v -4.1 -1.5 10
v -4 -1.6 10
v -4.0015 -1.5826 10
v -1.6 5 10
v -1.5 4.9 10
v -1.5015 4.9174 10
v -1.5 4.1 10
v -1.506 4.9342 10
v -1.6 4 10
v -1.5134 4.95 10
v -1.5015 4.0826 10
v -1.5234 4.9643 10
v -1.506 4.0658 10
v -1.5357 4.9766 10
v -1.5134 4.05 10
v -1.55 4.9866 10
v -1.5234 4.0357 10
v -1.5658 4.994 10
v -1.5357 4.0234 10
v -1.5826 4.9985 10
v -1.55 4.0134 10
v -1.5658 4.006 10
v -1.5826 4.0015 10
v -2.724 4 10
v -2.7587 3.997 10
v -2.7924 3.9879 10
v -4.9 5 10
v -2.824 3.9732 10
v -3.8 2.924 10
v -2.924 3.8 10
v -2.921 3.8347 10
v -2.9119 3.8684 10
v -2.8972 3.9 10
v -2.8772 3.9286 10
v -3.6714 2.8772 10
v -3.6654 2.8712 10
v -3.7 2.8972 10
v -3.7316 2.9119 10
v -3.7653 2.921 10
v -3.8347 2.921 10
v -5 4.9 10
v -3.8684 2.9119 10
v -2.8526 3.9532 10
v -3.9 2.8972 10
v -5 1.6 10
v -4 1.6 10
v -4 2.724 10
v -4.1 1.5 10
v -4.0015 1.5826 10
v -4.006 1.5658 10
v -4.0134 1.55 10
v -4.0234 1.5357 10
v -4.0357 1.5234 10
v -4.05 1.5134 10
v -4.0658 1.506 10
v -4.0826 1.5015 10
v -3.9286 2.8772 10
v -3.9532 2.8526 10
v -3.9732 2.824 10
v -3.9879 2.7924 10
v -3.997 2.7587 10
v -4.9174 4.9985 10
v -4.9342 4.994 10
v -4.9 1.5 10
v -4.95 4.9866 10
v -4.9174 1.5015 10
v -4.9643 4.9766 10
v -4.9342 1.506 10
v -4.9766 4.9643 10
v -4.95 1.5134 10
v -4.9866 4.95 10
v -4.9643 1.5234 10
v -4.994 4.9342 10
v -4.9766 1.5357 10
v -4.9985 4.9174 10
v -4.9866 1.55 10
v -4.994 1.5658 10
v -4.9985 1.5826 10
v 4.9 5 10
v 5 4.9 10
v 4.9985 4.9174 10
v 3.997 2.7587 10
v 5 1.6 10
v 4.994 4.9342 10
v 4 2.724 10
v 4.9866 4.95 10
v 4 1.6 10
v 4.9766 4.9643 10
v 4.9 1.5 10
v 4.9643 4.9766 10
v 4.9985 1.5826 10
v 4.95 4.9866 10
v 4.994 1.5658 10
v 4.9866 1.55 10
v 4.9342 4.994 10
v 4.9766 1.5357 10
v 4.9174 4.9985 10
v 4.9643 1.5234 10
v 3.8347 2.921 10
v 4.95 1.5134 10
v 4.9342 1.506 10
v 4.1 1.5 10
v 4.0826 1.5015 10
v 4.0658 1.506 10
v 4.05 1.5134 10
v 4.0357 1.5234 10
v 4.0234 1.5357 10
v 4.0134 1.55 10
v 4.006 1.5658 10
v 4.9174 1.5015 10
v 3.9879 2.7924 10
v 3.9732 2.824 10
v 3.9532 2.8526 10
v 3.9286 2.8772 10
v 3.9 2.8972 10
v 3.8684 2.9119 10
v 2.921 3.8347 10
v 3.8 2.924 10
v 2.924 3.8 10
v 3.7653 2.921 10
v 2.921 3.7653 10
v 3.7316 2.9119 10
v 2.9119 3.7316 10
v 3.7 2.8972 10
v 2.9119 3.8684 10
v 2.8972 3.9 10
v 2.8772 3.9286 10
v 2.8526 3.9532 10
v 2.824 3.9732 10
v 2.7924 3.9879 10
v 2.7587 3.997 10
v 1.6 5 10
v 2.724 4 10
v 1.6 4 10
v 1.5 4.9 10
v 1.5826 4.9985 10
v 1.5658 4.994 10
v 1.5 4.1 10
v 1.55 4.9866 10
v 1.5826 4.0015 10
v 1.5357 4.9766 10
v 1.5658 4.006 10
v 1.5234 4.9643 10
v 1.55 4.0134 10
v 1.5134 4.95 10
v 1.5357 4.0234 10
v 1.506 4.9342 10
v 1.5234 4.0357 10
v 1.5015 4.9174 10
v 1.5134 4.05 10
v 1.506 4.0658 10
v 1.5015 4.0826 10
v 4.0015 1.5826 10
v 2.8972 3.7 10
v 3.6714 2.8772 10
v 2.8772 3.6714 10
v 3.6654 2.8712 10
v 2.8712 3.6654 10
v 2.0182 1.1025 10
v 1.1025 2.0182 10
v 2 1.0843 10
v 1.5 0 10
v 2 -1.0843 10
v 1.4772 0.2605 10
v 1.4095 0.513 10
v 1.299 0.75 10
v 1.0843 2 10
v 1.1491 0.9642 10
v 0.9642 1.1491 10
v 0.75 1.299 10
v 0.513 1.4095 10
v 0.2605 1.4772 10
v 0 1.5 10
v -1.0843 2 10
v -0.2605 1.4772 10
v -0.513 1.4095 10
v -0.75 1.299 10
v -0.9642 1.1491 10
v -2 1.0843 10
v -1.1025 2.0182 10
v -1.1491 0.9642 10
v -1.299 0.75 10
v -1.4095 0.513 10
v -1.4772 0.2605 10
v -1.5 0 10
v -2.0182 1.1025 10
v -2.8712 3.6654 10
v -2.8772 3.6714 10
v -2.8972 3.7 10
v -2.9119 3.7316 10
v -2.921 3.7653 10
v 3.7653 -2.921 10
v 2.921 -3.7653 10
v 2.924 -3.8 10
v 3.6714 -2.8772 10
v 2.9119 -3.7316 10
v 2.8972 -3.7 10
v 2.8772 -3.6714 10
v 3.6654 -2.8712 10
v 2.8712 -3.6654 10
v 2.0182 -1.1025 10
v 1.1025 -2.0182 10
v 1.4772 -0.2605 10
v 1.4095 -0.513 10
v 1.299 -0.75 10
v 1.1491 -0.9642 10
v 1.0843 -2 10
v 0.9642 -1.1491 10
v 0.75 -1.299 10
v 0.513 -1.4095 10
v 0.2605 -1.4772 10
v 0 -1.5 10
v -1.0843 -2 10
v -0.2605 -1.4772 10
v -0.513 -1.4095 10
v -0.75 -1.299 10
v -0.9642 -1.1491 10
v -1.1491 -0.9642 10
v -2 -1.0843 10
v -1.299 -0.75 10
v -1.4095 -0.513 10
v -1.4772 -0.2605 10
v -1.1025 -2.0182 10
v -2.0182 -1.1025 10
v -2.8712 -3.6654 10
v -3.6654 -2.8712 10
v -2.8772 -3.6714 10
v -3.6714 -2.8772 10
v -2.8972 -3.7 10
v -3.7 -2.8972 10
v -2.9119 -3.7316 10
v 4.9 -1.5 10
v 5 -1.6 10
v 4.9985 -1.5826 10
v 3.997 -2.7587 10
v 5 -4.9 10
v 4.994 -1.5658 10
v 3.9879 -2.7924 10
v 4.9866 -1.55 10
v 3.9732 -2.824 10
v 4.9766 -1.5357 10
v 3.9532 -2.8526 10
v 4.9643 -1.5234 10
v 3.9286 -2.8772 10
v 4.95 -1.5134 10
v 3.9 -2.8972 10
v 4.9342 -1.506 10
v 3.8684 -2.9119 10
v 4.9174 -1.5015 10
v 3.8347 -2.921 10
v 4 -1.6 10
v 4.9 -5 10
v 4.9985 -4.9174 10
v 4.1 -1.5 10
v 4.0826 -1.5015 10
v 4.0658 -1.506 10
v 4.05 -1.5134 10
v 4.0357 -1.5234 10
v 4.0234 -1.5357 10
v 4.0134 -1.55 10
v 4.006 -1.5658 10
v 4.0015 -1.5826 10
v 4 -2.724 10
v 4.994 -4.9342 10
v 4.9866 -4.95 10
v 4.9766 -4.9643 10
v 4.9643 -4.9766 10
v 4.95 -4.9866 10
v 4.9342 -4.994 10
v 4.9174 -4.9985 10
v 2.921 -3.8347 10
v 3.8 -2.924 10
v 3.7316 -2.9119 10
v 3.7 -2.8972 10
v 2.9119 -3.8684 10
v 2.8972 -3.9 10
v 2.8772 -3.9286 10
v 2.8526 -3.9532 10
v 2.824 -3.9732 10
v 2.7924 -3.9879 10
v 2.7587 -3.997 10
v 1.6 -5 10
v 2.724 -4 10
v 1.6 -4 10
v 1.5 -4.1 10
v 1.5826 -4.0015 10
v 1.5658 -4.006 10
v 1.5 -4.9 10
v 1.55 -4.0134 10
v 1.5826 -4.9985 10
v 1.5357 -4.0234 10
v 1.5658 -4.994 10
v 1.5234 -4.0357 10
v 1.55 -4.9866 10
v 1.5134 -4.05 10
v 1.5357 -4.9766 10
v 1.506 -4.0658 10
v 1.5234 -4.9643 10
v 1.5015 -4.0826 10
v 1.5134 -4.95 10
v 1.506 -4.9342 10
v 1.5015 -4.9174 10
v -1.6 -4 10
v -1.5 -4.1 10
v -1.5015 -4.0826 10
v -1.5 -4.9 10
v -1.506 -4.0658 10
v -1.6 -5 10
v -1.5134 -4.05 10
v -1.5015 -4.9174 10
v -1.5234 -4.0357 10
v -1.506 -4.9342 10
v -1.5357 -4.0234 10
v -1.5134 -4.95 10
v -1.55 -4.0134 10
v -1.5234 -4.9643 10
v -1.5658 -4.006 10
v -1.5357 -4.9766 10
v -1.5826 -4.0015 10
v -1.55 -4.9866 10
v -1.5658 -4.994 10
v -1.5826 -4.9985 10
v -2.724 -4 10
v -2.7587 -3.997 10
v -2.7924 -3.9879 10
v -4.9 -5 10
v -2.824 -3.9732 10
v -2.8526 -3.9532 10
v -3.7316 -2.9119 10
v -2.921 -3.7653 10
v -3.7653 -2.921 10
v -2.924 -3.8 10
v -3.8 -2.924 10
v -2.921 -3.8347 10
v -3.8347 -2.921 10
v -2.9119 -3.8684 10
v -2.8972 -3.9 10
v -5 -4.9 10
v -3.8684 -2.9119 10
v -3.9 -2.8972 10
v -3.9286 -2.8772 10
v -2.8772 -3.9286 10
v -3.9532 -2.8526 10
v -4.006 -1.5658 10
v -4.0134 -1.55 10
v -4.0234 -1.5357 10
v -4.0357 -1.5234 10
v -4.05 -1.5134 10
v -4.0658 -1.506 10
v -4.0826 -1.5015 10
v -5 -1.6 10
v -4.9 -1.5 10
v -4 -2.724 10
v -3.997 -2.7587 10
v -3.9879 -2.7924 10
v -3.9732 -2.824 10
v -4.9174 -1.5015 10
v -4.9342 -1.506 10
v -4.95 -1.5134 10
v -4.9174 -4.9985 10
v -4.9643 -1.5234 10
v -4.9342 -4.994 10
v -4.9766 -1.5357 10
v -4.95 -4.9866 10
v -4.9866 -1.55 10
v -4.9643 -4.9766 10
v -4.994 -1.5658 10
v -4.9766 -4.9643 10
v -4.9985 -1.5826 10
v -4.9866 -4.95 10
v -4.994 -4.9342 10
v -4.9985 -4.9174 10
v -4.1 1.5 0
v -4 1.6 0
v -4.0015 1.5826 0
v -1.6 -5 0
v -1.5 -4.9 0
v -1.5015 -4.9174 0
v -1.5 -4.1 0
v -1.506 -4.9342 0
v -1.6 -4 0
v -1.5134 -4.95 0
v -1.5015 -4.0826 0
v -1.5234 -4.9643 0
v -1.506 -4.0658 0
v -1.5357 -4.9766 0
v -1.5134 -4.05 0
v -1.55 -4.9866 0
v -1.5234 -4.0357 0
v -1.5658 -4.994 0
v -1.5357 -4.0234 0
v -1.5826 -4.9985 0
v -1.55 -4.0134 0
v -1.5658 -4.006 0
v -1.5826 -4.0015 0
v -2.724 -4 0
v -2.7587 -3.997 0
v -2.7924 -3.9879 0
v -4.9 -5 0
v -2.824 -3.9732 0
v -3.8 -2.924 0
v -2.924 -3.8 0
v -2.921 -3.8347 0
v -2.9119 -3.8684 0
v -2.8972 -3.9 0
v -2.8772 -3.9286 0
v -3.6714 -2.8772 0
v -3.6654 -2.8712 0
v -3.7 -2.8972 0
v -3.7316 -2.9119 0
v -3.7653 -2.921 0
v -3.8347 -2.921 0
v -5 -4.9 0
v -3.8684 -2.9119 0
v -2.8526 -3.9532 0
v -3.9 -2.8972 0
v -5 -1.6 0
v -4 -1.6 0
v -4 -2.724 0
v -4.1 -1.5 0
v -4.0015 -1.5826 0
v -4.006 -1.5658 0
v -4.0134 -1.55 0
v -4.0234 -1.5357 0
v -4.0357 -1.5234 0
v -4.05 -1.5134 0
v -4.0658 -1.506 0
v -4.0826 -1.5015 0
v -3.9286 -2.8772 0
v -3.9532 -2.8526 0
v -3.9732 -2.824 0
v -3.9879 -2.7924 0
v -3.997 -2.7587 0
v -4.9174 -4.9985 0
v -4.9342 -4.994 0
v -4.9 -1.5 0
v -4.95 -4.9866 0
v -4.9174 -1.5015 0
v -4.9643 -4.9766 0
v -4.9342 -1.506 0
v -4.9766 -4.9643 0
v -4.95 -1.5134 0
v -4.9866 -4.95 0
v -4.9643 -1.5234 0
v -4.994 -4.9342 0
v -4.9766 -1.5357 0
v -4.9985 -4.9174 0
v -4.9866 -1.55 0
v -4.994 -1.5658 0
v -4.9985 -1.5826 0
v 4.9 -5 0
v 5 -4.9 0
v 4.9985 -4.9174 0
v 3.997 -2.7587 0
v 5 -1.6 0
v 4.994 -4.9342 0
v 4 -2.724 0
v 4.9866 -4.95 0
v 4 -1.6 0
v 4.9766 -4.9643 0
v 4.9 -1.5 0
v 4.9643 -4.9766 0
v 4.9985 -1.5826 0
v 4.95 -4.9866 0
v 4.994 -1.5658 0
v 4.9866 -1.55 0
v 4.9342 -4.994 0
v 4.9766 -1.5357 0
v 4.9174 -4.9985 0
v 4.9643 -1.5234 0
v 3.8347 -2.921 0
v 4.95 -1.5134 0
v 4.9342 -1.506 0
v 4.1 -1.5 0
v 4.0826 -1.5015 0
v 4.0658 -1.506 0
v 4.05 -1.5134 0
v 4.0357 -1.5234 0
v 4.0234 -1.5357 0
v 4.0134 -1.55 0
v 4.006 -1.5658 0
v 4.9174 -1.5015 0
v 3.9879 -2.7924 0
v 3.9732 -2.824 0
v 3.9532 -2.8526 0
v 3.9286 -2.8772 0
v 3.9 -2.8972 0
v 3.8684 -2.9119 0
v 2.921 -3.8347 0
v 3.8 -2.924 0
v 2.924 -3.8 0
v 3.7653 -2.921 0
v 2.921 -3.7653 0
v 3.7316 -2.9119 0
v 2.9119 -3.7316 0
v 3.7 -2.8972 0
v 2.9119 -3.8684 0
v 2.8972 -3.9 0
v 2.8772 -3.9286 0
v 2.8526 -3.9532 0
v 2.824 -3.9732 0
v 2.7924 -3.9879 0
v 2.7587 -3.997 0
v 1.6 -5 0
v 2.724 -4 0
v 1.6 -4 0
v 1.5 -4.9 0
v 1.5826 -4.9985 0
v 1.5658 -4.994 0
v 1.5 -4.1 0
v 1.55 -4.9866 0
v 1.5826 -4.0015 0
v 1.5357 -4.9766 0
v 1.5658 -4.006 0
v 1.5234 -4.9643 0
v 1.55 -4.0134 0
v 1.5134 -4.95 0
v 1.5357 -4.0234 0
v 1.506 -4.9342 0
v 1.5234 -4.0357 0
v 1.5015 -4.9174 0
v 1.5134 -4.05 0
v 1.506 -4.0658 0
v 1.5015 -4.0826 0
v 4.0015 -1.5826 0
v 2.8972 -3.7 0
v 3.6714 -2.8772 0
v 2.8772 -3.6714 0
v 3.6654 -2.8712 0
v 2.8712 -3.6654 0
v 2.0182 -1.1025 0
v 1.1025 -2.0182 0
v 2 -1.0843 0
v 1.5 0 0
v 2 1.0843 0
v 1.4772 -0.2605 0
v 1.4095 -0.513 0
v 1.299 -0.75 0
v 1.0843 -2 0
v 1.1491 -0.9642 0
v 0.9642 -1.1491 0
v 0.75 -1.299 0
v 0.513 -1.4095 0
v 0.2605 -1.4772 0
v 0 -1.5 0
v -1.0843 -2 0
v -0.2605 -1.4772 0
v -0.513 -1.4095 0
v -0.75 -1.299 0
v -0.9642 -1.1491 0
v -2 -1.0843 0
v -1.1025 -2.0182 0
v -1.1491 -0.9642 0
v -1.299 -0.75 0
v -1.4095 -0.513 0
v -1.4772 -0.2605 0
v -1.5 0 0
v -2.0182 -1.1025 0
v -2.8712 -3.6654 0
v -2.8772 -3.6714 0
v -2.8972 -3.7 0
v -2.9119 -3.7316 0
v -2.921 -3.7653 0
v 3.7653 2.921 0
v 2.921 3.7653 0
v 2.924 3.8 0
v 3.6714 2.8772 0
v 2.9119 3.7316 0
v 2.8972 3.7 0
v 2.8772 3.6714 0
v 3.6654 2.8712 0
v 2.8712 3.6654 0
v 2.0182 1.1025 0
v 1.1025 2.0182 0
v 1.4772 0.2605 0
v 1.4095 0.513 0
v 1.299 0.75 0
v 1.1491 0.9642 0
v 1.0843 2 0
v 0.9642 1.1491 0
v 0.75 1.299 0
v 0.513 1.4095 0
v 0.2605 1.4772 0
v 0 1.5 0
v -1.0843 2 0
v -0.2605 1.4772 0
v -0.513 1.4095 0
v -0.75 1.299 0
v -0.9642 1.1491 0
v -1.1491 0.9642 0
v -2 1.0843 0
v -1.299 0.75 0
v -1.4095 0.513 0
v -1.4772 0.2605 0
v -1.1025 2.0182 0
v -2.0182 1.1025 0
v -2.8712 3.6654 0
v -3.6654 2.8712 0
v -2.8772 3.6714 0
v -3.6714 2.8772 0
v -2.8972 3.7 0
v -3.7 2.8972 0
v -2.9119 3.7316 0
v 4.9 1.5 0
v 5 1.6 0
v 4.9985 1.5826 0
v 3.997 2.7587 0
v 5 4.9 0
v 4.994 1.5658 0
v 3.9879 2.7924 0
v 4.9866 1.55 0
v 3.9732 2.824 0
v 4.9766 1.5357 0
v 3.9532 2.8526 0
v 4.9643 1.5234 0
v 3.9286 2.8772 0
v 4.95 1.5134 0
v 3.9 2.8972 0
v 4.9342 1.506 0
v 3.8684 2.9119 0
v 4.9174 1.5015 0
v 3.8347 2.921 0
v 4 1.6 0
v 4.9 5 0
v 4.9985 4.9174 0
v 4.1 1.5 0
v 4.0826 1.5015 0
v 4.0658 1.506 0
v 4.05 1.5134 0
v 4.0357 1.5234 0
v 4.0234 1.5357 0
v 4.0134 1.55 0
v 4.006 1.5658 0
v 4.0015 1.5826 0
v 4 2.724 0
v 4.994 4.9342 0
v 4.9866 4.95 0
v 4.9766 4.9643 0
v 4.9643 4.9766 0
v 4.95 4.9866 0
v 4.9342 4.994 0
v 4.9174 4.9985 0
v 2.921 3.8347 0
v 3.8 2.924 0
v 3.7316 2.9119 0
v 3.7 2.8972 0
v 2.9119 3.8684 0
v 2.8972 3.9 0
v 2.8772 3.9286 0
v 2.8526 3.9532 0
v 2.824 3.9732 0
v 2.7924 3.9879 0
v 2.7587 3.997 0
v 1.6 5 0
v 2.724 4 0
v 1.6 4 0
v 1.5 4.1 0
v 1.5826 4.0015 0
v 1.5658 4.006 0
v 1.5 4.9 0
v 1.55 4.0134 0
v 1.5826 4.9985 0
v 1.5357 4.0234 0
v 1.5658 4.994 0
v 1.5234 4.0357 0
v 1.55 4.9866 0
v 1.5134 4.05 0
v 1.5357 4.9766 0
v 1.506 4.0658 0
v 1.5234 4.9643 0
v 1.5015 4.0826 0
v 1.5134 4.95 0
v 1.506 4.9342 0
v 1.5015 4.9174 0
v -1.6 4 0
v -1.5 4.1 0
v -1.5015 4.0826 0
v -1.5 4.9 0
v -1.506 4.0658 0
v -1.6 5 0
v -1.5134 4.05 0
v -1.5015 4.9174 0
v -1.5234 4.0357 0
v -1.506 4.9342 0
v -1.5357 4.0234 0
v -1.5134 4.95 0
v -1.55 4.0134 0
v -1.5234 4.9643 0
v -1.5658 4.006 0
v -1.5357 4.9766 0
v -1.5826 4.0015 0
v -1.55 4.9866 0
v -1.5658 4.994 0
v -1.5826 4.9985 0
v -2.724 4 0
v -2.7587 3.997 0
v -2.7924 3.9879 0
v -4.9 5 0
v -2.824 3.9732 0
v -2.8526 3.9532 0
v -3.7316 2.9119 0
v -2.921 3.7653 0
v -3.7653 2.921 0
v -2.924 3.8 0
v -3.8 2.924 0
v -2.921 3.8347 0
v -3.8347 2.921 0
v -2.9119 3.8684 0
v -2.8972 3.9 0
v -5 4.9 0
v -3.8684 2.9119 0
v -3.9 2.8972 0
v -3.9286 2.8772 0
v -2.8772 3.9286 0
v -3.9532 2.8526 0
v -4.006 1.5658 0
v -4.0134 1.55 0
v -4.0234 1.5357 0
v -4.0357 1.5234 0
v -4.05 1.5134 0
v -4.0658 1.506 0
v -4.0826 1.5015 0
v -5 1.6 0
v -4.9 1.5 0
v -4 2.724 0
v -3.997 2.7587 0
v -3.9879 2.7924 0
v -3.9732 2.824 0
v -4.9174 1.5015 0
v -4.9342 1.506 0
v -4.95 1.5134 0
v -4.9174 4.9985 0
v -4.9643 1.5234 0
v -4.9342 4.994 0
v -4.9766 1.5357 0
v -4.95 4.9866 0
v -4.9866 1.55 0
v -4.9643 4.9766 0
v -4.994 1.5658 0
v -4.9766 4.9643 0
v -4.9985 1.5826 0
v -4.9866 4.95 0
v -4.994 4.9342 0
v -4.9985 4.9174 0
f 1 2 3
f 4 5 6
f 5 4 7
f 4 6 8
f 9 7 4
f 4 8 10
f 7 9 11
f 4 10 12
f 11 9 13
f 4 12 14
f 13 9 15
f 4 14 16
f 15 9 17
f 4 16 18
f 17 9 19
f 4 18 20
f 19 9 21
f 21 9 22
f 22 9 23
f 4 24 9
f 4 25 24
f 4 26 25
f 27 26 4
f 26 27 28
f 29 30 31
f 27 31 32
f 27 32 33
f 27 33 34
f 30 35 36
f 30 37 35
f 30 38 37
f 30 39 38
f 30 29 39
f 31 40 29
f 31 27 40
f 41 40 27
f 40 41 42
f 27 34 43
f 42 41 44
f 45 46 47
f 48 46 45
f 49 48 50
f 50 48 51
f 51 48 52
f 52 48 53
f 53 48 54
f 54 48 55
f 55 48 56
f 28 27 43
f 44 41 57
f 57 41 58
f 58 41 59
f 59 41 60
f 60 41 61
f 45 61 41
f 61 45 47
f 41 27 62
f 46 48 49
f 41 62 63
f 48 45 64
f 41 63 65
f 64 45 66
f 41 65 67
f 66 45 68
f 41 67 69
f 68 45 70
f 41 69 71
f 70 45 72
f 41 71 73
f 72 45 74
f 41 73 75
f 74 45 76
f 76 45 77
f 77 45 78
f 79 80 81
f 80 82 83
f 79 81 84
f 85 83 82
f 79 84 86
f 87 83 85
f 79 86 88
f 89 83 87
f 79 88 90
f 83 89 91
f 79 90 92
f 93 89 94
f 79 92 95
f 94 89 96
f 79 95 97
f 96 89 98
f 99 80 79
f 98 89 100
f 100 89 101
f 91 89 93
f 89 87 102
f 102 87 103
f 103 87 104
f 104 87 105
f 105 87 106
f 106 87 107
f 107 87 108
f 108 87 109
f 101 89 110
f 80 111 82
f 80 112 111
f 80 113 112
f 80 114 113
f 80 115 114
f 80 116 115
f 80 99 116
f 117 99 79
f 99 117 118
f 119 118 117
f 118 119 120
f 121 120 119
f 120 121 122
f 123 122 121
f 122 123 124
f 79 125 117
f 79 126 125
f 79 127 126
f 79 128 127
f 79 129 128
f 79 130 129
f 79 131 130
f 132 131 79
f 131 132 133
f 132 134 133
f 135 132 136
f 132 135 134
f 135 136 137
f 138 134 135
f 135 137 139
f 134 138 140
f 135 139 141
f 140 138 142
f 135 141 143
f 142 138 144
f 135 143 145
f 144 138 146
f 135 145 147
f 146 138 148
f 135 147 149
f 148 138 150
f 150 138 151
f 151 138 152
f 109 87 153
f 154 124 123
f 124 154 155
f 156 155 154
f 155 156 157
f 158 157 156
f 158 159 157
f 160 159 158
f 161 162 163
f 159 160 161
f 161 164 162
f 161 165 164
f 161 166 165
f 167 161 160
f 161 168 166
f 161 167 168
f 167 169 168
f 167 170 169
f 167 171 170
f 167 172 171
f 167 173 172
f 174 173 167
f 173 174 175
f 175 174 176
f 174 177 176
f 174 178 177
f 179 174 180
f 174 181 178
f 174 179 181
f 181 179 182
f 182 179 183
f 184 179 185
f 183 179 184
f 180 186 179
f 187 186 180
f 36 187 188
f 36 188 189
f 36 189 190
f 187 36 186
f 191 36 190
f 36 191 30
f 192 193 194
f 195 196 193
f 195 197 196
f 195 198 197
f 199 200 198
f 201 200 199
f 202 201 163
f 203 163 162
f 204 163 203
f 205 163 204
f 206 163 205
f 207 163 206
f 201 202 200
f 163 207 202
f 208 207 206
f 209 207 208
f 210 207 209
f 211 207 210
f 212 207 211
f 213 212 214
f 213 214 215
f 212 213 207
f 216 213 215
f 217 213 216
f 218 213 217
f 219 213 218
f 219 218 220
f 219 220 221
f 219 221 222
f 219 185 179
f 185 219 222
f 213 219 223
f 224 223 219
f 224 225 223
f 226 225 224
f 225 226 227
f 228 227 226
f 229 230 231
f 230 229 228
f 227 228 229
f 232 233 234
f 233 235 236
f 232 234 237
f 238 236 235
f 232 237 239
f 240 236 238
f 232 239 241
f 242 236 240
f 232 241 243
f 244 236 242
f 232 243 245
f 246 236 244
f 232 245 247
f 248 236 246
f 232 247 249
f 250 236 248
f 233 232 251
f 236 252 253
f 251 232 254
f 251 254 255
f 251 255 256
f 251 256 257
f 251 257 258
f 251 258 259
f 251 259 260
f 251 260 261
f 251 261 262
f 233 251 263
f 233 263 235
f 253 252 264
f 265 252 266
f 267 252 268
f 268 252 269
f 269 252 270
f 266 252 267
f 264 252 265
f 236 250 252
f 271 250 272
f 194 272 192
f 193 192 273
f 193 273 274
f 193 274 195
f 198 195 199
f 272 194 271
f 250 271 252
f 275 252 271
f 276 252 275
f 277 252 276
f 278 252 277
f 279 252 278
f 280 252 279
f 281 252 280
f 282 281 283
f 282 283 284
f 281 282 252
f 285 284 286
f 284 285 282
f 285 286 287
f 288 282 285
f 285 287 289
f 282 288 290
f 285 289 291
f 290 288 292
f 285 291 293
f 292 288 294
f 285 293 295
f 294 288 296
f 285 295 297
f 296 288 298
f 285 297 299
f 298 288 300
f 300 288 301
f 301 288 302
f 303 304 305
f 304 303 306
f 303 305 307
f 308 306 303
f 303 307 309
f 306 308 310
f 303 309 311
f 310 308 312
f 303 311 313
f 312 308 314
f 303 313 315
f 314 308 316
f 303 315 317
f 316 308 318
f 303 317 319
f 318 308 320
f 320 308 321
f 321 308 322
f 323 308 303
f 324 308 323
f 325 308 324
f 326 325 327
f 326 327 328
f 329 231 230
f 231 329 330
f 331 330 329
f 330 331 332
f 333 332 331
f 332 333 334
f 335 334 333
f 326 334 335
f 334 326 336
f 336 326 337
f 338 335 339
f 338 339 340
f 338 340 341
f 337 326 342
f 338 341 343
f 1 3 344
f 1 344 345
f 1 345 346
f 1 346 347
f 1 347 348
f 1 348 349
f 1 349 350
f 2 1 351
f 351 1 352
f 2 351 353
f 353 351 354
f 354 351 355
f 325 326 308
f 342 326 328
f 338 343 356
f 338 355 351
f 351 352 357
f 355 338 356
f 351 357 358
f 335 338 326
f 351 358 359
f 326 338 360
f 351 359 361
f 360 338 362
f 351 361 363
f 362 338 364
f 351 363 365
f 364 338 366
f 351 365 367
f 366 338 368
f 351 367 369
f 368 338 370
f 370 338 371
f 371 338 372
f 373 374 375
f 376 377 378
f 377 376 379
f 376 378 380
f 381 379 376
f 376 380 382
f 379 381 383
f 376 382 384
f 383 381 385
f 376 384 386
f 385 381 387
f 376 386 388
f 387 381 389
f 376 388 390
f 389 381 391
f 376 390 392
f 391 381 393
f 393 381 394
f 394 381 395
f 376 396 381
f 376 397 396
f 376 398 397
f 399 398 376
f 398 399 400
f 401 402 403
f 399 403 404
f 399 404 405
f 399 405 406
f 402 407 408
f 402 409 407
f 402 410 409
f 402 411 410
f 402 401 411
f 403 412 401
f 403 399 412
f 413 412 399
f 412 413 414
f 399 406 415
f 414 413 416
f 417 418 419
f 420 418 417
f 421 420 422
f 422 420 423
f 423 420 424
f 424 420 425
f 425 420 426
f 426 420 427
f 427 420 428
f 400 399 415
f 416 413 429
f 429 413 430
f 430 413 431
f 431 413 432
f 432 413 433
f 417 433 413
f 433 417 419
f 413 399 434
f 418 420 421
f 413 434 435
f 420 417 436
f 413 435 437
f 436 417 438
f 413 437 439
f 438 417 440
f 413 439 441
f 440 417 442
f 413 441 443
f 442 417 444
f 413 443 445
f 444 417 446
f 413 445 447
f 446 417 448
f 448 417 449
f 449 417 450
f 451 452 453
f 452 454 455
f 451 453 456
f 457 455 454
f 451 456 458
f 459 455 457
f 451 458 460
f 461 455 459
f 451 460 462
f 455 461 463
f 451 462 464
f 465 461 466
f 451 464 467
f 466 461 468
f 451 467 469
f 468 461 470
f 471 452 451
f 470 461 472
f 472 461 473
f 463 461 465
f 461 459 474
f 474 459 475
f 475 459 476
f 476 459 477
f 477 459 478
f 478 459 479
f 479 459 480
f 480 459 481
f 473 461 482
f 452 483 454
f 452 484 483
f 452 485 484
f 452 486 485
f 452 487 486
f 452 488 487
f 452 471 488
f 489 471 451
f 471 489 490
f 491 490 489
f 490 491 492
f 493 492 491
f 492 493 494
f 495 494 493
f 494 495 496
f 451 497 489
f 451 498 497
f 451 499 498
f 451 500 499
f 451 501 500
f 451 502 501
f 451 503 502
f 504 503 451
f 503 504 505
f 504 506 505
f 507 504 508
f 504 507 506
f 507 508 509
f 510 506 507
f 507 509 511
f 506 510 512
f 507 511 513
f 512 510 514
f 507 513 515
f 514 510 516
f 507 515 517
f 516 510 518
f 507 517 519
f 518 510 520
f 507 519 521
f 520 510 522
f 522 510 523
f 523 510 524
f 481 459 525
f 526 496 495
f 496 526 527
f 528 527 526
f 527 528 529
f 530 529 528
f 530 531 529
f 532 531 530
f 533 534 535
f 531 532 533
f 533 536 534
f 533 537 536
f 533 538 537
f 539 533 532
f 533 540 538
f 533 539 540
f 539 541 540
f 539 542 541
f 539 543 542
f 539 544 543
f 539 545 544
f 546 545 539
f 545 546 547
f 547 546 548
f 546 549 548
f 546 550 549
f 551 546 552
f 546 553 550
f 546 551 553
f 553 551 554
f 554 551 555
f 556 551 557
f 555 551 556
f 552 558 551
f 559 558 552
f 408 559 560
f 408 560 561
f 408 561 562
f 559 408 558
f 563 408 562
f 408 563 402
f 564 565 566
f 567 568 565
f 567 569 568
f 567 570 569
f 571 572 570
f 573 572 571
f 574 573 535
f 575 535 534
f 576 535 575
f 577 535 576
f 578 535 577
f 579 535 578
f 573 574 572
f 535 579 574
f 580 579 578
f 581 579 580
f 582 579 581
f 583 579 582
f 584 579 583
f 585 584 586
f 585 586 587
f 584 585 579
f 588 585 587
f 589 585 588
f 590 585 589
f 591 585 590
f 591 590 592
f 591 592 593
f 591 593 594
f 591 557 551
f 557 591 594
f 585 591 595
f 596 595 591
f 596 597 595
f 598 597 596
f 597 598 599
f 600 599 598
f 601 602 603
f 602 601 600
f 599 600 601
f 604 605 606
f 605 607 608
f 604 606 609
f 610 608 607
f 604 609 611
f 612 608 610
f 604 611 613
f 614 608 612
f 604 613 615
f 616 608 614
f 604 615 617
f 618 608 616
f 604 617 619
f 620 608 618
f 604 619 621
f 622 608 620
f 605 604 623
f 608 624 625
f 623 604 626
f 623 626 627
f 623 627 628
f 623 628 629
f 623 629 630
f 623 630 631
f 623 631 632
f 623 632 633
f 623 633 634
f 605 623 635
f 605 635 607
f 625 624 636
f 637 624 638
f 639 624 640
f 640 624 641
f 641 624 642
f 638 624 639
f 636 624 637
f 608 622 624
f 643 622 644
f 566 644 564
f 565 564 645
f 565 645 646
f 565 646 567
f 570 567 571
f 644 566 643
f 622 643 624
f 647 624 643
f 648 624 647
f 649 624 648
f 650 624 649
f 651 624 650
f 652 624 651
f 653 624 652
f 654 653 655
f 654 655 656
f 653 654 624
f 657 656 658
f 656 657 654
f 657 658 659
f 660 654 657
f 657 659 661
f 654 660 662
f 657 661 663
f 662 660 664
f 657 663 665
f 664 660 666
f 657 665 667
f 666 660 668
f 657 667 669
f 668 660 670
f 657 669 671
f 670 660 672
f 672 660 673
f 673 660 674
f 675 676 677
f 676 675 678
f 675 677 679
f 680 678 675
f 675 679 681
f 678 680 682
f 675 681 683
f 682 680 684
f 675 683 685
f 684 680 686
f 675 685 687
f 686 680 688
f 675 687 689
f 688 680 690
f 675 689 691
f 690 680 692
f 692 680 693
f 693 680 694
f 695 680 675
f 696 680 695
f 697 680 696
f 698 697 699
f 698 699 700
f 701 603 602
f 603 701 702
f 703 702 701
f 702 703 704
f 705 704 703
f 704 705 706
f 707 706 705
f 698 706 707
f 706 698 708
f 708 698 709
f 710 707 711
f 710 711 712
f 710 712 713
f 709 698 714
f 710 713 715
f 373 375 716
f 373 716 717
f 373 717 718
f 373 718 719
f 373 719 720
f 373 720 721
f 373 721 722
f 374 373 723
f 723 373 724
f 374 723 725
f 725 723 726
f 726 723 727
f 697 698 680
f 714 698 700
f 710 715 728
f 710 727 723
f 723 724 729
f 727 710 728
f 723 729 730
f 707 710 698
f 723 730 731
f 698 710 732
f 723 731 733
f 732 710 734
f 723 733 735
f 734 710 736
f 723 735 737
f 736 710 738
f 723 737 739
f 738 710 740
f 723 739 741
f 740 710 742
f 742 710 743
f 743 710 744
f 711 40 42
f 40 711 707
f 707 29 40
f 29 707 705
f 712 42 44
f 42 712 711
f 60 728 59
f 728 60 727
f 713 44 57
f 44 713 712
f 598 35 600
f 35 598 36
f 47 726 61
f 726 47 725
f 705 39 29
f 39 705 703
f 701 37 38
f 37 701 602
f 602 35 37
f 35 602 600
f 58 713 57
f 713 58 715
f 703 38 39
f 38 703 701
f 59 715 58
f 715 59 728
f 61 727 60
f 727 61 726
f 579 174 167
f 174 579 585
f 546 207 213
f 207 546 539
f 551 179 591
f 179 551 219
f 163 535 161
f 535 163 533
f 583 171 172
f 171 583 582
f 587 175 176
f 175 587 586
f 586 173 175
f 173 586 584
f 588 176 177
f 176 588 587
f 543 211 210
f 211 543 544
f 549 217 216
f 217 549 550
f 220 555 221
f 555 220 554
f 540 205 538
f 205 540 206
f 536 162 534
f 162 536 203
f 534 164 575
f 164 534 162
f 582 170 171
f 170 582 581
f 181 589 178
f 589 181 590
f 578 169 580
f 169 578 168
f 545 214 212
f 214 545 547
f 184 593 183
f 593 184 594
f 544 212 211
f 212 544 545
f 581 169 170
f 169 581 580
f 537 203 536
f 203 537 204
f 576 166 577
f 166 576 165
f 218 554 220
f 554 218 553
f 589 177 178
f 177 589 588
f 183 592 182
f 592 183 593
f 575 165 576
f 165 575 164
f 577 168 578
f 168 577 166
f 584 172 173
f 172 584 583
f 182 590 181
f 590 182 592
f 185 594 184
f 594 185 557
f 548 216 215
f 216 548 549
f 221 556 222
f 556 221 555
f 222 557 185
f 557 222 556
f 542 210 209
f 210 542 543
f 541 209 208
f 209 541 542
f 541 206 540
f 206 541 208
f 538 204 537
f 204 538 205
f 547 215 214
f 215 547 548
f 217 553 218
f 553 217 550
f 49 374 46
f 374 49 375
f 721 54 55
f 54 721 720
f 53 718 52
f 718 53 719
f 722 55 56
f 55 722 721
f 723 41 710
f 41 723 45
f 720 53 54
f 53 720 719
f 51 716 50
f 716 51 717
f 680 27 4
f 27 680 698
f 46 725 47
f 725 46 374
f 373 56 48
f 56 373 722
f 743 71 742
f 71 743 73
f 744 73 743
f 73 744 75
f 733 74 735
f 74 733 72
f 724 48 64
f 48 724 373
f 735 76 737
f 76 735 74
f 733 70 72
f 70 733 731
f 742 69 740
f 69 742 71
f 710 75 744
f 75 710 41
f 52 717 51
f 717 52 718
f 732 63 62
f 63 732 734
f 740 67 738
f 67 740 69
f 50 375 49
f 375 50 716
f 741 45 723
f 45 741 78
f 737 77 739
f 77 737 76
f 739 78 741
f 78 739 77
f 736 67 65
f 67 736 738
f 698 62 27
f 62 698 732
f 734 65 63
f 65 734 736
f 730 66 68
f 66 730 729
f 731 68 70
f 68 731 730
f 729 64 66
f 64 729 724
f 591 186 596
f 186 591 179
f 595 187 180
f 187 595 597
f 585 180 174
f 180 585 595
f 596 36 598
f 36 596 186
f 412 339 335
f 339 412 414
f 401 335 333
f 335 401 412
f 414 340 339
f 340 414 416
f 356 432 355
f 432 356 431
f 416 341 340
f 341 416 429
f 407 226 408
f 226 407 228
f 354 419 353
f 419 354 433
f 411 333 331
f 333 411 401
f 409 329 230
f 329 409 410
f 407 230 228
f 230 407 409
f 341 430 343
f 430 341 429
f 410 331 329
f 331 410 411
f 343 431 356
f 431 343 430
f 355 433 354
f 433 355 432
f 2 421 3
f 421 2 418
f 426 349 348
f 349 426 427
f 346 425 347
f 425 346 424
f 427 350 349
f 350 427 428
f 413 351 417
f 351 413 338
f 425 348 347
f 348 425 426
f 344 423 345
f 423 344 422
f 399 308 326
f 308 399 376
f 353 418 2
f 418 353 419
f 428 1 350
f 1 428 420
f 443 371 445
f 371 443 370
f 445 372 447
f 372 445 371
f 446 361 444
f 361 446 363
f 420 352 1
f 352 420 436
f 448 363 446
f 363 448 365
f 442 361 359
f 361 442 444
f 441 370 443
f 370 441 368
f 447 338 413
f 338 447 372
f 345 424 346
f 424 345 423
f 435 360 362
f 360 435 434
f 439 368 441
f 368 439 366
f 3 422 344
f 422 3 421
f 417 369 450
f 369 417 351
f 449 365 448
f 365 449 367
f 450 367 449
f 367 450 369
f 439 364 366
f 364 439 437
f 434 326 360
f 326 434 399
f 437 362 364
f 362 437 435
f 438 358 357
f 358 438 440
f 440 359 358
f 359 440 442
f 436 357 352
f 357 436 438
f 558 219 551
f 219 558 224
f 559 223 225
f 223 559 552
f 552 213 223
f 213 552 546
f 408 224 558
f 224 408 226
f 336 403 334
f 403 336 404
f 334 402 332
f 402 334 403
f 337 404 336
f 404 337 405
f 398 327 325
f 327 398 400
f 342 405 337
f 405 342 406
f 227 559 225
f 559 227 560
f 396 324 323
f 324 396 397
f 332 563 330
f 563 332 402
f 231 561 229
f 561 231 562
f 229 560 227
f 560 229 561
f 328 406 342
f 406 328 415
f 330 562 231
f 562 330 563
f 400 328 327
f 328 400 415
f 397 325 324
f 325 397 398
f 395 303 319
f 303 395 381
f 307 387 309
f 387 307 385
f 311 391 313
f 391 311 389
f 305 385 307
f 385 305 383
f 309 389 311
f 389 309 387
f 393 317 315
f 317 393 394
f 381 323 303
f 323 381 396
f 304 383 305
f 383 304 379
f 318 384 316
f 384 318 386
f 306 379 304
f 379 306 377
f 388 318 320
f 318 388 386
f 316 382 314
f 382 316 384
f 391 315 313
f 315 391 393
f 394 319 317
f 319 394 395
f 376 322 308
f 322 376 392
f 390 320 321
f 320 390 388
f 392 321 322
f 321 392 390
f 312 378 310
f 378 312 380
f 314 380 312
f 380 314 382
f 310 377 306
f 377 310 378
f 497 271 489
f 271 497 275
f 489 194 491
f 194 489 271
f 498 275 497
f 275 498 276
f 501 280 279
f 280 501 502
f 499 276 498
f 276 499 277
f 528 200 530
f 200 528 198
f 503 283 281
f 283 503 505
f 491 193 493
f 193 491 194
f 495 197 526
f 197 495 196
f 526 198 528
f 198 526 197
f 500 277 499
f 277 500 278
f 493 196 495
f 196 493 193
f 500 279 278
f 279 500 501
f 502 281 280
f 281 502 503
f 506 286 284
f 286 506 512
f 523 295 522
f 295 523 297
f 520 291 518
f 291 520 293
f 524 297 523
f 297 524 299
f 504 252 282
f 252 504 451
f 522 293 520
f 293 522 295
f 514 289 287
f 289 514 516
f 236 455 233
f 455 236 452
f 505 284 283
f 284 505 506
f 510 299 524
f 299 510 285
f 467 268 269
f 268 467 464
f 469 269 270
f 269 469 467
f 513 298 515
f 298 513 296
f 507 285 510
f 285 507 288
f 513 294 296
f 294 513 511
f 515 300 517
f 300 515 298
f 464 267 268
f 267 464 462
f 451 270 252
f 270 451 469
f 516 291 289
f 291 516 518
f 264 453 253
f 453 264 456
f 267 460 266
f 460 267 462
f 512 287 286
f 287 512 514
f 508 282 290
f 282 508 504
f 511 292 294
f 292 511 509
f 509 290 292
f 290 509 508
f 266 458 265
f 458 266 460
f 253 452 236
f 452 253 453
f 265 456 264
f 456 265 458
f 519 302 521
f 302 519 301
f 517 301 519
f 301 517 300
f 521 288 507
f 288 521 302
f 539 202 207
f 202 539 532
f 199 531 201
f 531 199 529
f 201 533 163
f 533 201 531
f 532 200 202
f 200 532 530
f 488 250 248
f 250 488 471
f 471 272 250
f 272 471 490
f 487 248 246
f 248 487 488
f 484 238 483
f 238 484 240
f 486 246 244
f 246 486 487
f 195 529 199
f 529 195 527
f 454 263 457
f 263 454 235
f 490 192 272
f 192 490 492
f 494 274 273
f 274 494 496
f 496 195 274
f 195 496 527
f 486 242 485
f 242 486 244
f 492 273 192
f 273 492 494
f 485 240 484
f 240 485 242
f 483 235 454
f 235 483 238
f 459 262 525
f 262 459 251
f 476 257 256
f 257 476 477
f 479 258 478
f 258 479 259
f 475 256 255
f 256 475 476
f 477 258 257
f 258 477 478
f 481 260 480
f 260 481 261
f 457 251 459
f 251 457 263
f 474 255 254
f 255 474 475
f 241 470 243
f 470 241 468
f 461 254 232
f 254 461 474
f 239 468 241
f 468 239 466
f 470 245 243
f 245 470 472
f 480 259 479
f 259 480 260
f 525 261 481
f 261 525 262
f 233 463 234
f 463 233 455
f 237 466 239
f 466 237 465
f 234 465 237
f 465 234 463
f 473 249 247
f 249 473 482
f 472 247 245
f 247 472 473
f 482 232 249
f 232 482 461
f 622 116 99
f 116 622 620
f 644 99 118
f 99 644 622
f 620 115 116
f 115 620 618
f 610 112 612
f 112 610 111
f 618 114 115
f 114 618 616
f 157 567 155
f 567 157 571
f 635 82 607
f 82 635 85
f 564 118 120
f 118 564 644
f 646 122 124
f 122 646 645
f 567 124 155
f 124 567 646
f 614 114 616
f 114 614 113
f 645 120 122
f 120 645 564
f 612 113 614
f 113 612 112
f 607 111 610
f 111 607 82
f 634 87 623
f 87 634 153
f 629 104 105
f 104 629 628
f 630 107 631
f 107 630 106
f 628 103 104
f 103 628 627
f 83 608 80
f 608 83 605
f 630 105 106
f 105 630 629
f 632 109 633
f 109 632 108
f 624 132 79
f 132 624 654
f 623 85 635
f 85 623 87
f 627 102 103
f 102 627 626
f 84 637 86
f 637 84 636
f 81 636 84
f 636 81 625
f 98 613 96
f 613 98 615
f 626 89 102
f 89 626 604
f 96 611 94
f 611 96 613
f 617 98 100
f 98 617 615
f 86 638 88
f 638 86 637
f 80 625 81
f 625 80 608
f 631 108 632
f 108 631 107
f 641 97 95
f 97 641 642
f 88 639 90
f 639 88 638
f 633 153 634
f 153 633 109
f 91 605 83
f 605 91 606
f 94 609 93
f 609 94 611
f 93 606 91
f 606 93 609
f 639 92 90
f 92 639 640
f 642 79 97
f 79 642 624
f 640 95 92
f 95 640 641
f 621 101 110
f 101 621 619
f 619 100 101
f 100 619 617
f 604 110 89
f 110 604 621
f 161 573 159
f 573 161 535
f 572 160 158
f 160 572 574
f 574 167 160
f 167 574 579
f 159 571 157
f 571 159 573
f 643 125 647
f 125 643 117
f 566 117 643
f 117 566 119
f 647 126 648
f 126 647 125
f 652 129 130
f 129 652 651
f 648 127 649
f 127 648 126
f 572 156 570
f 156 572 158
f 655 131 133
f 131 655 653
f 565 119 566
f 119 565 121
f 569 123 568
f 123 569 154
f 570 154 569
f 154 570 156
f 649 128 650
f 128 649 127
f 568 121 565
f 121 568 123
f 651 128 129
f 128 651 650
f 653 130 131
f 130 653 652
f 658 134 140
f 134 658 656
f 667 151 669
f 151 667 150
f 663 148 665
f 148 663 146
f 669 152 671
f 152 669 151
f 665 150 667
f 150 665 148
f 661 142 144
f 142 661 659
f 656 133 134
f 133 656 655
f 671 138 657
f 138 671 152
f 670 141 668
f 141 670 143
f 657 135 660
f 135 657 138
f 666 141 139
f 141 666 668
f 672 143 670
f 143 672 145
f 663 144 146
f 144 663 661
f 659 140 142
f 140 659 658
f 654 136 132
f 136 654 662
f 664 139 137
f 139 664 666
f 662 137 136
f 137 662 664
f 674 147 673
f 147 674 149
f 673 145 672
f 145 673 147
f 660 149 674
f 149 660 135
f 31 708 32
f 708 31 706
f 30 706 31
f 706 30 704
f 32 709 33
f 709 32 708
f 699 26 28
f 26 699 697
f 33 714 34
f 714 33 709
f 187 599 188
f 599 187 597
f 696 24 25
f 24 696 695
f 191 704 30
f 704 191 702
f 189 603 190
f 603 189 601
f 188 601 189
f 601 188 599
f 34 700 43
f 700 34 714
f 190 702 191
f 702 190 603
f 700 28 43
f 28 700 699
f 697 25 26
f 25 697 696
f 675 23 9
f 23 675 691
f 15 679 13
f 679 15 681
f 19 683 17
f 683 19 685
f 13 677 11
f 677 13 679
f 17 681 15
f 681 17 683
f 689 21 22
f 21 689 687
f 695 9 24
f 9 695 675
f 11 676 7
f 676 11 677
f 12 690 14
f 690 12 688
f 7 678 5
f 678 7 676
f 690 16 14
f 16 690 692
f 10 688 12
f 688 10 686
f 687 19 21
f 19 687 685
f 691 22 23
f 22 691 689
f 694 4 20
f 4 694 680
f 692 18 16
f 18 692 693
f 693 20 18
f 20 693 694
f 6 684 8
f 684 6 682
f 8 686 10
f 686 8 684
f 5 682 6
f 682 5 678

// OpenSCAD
mbL=10;

MB10(mbL);

module MB10(bmL){
    
for(i=[1:4]){
    rotate([0,0,90*i]){
mbCorner();    

mirror(1,0,0)
mbCorner();    
    }
}
}

module mbCorner(){
bmX=10;
bmCX=4;
cornerD=0.2;
innerD=0.4;
armD1=1;
armD2=1.3;
boltD=3;
hull(){
translate([(bmX/2)-(cornerD/2),(bmX/2)-(cornerD/2),0])
    cylinder(d=cornerD, h=mbL, $fn=36);
translate([(bmX/2)+(cornerD/2)-3.5,(bmX/2)-(cornerD/2),0])    
    cylinder(d=cornerD, h=mbL, $fn=36);
    
translate([(bmX/2)+(cornerD/2)-3.5,(bmX/2)+(cornerD/2)-1,0])
    cylinder(d=cornerD, h=mbL, $fn=36);
translate([(bmX/2)-(cornerD/2),(bmX/2)+(cornerD/2)-1,0])    
    cylinder(d=cornerD, h=mbL, $fn=36);
}

hull(){
translate([(bmX/2)-(armD1/2),(bmX/2)-(armD1/2),0])
    cylinder(d=armD1, h=mbL, $fn=36);
translate([(cos(45)*((boltD+armD2)/2)),(cos(45)*((boltD+armD2)/2)),0])
    cylinder(d=armD2, h=mbL, $fn=36);
}

translate([(bmX/2)-2.276,(bmX/2)-1-(innerD/2),0])
difference(){
    union(){
    rotate([0,0,45])
    translate([innerD,0,mbL/2])
    #cube([innerD*2,innerD*2,mbL],center=true);   
    }
    cylinder(d=innerD,h=mbL,$fn=36);
    
    translate([-innerD/2,0,mbL/2])
    #cube([innerD,innerD,mbL],center=true);

}


difference(){
translate([-(bmCX/2),-(bmCX/2),0])
cube([bmCX,bmCX,mbL]);
cylinder(d=boltD,h=mbL,$fn=36);
}    
    } //end corner module
